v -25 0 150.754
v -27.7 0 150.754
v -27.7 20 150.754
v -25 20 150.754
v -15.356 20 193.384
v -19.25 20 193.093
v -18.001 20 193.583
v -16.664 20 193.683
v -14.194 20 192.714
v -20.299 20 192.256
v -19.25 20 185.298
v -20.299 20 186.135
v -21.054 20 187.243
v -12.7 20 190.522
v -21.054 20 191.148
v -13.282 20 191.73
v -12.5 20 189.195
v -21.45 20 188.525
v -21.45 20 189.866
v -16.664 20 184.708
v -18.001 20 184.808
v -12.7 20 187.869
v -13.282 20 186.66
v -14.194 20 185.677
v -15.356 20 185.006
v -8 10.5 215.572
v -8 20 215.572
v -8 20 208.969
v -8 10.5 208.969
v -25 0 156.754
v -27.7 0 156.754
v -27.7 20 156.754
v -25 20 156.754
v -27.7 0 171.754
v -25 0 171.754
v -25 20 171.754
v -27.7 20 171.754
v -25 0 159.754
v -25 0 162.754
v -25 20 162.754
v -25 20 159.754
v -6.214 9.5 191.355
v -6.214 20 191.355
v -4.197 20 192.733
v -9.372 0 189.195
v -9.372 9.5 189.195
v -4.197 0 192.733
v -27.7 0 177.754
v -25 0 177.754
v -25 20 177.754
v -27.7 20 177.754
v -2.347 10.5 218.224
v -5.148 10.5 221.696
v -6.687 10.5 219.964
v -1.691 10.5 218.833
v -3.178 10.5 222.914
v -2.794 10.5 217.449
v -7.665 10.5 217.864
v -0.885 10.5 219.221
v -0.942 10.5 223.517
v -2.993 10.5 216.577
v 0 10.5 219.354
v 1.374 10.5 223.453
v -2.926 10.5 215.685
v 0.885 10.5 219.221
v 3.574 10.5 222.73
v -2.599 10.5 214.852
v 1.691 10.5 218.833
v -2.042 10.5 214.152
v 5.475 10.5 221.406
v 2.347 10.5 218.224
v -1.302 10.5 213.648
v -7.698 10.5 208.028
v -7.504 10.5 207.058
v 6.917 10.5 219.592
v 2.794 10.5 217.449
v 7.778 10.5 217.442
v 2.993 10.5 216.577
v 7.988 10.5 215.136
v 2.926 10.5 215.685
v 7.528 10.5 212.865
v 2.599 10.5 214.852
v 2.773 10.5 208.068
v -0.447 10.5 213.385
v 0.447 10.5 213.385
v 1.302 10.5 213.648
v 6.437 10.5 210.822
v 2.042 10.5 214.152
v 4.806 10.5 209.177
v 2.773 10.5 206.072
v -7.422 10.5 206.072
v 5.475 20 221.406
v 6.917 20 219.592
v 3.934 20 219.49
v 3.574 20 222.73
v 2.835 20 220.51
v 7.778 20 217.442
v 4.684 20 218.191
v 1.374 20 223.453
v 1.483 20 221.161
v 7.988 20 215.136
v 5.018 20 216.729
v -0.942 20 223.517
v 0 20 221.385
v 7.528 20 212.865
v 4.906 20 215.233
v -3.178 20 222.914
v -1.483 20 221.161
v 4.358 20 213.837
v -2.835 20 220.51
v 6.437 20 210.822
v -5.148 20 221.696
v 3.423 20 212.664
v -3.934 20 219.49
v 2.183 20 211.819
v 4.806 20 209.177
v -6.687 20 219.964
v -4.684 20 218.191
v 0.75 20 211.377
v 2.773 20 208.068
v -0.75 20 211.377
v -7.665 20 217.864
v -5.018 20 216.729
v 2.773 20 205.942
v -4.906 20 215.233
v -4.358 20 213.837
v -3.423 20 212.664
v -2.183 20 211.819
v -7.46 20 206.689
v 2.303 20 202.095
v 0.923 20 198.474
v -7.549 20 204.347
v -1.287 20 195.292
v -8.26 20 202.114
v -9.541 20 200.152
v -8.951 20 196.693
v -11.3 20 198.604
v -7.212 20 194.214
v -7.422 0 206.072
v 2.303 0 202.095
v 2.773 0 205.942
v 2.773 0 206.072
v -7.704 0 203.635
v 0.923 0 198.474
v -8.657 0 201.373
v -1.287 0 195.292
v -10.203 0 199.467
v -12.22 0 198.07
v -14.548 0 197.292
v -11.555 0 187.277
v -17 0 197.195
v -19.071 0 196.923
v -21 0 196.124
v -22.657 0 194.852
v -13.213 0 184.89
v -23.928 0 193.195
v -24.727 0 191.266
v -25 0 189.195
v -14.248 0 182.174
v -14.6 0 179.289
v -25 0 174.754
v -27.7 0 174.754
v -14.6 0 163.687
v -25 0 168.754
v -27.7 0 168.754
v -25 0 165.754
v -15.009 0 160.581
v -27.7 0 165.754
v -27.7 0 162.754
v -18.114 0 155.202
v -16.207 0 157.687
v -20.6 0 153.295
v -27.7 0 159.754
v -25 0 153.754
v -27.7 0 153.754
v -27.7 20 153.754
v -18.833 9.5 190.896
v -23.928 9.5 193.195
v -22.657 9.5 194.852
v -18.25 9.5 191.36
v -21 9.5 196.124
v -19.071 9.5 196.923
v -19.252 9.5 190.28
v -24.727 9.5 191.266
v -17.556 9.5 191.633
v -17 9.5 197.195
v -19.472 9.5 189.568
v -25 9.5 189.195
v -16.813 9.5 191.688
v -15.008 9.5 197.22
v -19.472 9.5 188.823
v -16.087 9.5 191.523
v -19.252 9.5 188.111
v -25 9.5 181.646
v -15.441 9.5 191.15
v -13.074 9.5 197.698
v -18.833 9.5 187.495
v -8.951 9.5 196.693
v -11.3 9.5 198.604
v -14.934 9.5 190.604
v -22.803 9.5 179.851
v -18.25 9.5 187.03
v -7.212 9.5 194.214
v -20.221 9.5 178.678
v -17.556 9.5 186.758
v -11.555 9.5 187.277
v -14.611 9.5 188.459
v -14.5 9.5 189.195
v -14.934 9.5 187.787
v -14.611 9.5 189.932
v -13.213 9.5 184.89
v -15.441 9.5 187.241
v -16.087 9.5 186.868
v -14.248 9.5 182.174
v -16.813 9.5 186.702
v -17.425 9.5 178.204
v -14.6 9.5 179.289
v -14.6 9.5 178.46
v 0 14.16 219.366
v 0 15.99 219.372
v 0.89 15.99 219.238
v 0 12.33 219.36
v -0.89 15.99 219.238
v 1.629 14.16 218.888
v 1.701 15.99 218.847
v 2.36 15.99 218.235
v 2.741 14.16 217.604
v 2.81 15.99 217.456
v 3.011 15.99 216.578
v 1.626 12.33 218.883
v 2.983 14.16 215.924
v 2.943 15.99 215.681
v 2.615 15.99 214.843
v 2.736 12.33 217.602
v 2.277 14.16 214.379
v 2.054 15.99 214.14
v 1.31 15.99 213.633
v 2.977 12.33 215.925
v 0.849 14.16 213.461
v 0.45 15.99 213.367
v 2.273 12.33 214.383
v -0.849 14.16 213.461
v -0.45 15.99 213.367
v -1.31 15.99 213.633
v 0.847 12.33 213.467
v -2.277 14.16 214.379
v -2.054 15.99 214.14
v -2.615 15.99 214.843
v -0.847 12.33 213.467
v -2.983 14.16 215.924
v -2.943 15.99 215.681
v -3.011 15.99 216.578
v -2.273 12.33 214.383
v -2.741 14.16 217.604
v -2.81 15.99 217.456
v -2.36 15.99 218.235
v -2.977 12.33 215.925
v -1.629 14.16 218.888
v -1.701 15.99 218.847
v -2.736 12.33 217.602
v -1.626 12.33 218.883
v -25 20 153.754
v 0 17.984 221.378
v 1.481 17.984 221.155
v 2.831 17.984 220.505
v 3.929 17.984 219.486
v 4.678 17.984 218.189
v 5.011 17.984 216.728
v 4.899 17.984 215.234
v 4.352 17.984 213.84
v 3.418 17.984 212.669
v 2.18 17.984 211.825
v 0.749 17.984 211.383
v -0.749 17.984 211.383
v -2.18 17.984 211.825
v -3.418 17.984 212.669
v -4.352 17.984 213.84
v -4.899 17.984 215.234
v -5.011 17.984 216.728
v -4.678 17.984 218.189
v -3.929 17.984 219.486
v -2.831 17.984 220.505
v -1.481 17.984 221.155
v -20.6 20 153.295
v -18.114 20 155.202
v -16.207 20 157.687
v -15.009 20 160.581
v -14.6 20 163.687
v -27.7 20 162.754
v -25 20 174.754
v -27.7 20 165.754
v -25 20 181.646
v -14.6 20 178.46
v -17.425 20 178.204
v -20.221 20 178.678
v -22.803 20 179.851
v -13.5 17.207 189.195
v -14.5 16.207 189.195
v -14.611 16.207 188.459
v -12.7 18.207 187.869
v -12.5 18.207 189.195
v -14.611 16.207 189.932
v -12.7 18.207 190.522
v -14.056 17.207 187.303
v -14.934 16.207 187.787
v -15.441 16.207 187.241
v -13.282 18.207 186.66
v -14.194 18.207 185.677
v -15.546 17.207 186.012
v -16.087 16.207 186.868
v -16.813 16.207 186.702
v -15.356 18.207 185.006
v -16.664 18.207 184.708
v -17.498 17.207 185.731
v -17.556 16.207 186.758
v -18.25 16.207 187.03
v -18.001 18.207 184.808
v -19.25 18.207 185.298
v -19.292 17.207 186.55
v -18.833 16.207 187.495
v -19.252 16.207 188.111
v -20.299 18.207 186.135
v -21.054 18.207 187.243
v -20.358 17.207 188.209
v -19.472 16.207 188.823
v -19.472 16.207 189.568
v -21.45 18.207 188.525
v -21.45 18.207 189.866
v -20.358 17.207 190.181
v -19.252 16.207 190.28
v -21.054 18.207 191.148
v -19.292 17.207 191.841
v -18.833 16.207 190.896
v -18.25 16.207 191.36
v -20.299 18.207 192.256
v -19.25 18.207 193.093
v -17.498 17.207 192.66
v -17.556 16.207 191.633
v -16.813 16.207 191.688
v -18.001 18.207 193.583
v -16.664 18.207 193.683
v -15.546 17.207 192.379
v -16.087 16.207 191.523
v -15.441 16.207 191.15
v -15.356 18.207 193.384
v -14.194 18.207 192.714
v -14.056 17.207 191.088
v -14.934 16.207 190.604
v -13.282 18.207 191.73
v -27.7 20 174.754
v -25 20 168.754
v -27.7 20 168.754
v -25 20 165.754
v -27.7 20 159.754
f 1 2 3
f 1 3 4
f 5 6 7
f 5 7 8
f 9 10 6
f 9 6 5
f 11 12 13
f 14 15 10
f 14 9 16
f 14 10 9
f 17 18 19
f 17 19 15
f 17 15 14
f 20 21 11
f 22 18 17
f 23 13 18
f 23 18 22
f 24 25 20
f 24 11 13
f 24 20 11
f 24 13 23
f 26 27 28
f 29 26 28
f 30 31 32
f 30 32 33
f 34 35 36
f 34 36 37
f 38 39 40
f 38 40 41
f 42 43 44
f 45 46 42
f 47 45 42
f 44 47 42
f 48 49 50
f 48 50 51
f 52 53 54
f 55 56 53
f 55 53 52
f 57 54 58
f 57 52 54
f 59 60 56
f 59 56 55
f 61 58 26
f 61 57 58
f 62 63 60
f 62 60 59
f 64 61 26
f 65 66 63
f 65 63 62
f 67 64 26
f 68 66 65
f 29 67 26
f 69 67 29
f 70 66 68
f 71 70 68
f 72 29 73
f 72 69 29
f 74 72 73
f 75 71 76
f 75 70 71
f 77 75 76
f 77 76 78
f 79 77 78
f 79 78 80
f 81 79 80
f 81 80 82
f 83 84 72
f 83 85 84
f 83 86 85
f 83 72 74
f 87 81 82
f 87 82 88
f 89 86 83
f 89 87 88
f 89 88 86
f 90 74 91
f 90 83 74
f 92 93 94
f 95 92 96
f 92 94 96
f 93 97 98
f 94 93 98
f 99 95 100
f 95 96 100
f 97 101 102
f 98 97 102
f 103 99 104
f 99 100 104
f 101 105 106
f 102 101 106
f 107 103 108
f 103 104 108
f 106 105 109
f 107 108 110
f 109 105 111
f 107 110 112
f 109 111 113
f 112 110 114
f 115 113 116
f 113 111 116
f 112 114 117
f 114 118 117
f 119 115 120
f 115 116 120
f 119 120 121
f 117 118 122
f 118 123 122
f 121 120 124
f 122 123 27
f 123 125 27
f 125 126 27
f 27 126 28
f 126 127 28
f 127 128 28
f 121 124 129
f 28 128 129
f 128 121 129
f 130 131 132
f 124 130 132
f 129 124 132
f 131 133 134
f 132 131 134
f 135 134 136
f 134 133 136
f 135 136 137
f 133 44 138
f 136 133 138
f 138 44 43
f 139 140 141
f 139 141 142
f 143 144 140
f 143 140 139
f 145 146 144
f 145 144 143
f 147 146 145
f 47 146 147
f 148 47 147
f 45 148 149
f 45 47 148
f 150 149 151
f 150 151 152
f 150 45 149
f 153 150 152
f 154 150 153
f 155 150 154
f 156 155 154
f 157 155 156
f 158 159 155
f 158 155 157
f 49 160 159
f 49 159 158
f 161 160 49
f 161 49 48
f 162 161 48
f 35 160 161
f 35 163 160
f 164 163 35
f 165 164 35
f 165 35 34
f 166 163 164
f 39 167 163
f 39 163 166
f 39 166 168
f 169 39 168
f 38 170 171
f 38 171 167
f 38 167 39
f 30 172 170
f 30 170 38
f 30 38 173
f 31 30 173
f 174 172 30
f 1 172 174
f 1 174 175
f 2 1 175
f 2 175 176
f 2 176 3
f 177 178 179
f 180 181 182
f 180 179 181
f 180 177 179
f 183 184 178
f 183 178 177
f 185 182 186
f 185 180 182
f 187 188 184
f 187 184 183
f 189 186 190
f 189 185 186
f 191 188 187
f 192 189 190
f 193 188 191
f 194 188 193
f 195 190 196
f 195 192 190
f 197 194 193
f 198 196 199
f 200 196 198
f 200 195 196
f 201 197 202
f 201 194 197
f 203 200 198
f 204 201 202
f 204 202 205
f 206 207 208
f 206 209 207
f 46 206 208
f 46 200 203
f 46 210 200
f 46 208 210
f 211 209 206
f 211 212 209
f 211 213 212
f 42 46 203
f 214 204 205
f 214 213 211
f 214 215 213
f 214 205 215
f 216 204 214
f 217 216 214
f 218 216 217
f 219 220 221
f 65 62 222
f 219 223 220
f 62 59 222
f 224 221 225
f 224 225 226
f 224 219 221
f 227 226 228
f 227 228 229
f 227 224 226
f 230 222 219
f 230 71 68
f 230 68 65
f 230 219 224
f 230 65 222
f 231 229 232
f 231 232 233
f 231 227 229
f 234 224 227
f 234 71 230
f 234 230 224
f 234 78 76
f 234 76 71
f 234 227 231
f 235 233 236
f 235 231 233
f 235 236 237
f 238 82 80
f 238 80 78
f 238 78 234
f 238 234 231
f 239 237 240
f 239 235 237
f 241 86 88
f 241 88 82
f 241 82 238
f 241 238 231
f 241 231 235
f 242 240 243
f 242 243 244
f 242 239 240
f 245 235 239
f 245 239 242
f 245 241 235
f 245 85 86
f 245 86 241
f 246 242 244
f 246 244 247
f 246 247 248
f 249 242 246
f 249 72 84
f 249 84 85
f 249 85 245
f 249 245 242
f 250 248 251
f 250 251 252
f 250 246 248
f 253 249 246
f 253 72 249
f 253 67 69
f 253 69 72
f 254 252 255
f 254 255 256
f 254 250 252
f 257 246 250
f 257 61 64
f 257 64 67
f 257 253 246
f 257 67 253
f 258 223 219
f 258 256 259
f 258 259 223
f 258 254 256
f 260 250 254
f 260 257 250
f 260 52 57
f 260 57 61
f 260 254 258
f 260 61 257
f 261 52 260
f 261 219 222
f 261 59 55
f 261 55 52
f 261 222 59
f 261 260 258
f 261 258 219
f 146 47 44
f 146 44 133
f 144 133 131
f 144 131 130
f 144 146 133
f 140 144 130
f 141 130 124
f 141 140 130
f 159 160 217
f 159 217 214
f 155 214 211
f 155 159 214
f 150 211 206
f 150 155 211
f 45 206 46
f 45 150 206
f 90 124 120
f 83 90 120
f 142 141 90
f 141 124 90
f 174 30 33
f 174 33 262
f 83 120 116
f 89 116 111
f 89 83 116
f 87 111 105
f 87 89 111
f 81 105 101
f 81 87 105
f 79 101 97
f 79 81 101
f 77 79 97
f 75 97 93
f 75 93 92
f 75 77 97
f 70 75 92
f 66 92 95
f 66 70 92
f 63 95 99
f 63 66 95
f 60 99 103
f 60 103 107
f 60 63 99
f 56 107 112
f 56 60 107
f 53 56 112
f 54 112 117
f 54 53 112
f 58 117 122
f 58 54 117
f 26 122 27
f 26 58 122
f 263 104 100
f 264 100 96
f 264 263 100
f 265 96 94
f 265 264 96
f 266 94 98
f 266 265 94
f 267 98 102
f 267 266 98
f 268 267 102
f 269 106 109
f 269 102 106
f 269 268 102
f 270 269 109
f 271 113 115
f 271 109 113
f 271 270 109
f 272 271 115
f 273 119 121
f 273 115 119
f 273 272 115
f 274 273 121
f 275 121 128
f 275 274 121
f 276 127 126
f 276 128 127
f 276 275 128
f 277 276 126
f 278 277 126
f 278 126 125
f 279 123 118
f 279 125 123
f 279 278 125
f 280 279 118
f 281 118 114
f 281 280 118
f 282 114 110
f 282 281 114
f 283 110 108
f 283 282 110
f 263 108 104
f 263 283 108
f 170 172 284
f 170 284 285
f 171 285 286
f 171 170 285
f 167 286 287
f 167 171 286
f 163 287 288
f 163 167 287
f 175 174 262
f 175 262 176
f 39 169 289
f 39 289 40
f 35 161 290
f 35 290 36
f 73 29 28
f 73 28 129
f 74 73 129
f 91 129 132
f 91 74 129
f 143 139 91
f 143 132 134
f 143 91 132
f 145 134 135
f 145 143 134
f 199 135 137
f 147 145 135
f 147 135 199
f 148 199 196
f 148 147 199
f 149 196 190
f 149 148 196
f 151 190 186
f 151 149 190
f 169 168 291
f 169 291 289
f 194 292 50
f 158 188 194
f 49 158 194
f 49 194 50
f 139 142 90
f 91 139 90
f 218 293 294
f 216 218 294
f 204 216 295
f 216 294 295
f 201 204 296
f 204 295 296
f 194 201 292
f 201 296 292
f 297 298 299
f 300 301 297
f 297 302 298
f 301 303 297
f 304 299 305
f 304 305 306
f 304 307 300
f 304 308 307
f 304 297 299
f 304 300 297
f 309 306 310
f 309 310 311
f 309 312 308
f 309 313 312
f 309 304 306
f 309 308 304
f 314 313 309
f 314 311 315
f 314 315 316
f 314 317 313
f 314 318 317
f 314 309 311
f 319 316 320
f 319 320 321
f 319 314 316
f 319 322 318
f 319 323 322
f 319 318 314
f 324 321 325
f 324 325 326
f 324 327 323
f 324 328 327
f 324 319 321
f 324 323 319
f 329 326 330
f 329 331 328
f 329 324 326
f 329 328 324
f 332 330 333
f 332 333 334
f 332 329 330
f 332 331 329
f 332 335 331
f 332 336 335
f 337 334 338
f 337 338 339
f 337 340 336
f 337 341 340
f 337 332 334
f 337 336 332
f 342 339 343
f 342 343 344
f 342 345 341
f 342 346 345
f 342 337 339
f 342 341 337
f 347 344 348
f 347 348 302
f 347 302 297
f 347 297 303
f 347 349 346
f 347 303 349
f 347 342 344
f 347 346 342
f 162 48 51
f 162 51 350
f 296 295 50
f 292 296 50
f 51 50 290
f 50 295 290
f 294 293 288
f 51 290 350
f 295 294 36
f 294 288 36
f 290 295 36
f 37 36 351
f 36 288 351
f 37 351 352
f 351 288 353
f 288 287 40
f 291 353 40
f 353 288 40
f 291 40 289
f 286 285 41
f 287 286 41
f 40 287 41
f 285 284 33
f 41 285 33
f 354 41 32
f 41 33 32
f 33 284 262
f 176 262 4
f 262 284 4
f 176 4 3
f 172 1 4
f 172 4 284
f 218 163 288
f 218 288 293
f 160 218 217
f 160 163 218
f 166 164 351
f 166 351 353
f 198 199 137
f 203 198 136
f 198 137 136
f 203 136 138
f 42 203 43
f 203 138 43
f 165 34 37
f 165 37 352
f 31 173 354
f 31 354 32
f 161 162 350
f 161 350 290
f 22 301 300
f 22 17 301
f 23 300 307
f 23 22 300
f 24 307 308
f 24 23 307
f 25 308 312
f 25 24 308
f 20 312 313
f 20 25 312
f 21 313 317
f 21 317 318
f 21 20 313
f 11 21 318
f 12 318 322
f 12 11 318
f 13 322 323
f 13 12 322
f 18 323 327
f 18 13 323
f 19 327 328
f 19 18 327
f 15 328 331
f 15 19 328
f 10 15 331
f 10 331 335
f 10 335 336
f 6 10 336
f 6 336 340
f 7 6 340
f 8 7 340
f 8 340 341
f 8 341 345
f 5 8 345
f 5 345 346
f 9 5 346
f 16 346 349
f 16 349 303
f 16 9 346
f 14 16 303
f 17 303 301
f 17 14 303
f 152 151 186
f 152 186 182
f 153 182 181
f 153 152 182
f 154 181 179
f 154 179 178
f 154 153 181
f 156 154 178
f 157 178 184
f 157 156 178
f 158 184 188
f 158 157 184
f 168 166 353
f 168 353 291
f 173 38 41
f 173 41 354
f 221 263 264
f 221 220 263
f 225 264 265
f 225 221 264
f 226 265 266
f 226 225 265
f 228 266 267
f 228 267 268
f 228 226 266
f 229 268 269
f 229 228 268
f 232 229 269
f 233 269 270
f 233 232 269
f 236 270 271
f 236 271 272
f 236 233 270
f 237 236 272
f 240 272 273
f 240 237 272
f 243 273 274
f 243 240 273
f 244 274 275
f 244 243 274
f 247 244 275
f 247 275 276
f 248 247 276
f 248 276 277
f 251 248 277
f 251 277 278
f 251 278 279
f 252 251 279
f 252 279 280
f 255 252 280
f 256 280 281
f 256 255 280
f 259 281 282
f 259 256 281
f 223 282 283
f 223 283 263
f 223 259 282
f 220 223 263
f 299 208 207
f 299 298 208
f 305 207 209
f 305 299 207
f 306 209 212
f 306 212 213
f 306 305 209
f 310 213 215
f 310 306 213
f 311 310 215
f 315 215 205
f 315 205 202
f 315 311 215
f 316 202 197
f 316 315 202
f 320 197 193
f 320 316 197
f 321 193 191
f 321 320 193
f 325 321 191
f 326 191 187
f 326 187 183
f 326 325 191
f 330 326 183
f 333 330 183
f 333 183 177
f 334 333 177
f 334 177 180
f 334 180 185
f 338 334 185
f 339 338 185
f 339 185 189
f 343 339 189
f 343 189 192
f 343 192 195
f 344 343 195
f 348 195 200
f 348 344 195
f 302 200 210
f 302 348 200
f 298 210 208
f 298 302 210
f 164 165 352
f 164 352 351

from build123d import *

# Parameters (mm, degrees)
BOSS_EXTRUDE1_DEPTH     = 20
SKETCH2_W               = 19.610643165
SKETCH2_H               = 11
CUT_EXTRUDE1_DEPTH      = 227.167829004
CUT_EXTRUDE1_DEPTH_BACK = 227.167829004
SKETCH7_R               = 11
CUT_EXTRUDE2_DEPTH      = 10.5
SKETCH6_W               = 2.5
SKETCH6_H               = 6.937111225


with BuildPart() as part:
    # Sketch1 → Boss-Extrude1 (new body)
    with BuildSketch(Plane(origin=(0, 0, 0), x_dir=(1, 0, 0), z_dir=(0, 1, 0))):
        with BuildLine():
            Line((-14.599777392, -163.687024017), (-14.599777392, -179.289222575))
            ThreePointArc((-14.599777392, -179.289222575), (-13.212758245, -184.889636615), (-9.372337822, -189.195403737))
            Line((-9.372337822, -189.195403737), (-4.197358995, -192.733382325))
            ThreePointArc((-4.197358995, -192.733382325), (0.923201568, -198.474405155), (2.772560431, -205.941623874))
            Line((2.772560431, -205.941623874), (2.772560431, -208.068159927))
            ThreePointArc((2.772560431, -208.068159927), (4.572718915, -222.13666845), (-8, -215.572352665))
            Line((-8, -215.572352665), (-8, -208.969123671))
            ThreePointArc((-8, -208.969123671), (-9.205712947, -200.564063539), (-17, -197.195403737))
            ThreePointArc((-17, -197.195403737), (-22.656854249, -194.852257987), (-25, -189.195403737))
            Line((-25, -189.195403737), (-25, -177.754249464))
            Line((-25, -177.754249464), (-27.7, -177.754249464))
            Line((-27.7, -177.754249464), (-27.7, -174.754249464))
            Line((-27.7, -174.754249464), (-25, -174.754249464))
            Line((-25, -174.754249464), (-25, -171.754249464))
            Line((-25, -171.754249464), (-27.7, -171.754249464))
            Line((-27.7, -171.754249464), (-27.7, -168.754249464))
            Line((-27.7, -168.754249464), (-25, -168.754249464))
            Line((-25, -168.754249464), (-25, -165.754249464))
            Line((-25, -165.754249464), (-27.7, -165.754249464))
            Line((-27.7, -165.754249464), (-27.7, -162.754249464))
            Line((-27.7, -162.754249464), (-25, -162.754249464))
            Line((-25, -162.754249464), (-25, -159.754249464))
            Line((-25, -159.754249464), (-27.7, -159.754249464))
            Line((-27.7, -159.754249464), (-27.7, -156.754249464))
            Line((-27.7, -156.754249464), (-25, -156.754249464))
            Line((-25, -156.754249464), (-25, -153.754249464))
            Line((-25, -153.754249464), (-27.7, -153.754249464))
            Line((-27.7, -153.754249464), (-27.7, -150.754249464))
            Line((-27.7, -150.754249464), (-25, -150.754249464))
            Line((-25, -150.754249464), (-20.599777392, -153.294719172))
            ThreePointArc((-20.599777392, -153.294719172), (-16.207472546, -157.687024017), (-14.599777392, -163.687024017))
        make_face()
    extrude(amount=BOSS_EXTRUDE1_DEPTH)

    # Sketch2 → Cut-Extrude1 (cut, two sides)
    with BuildSketch(Plane(origin=(0, 0, 0), x_dir=(0, 0, -1), z_dir=(1, 0, 0))) as cut_extrude1_sk:
        with Locations((-215.877674248, 5)):
            Rectangle(SKETCH2_W, SKETCH2_H)
    extrude(amount=CUT_EXTRUDE1_DEPTH, mode=Mode.SUBTRACT)
    extrude(cut_extrude1_sk.sketch, amount=-CUT_EXTRUDE1_DEPTH_BACK, mode=Mode.SUBTRACT)

    # Sketch4 → Cut-Revolve8 (revolve, cut)
    with BuildSketch(Plane(origin=(0, 0, 0), x_dir=(0, 0, -1), z_dir=(1, 0, 0)), mode=Mode.PRIVATE) as cut_revolve8_sk:
        Polygon((-213.371823115, 3.99935592), (-216.352696282, 4.00886504), (-216.352696282, 9.999898237), (-216.352696282, 21.744358227), (-211.315205583, 21.744358227), (-211.327201493, 17.983937872), (-213.333571374, 15.990328105), (-213.352711547, 9.990358634), align=None)
    revolve(cut_revolve8_sk.sketch.rotate(Axis((0, 4.00886504, 216.352696282), (0, 1, 0)), 180), axis=Axis((0, 4.00886504, 216.352696282), (0, 1, 0)), mode=Mode.SUBTRACT)

    # Sketch7 → Cut-Extrude2 (cut)
    with BuildSketch(Plane(origin=(0, 20, 0), x_dir=(1, 0, 0), z_dir=(0, 1, 0))):
        with Locations((-17, -189.195403737)):
            Circle(SKETCH7_R)
    extrude(amount=-CUT_EXTRUDE2_DEPTH, mode=Mode.SUBTRACT)

    # Sketch6 → Revolve2 (revolve)
    with BuildSketch(Plane.XY.offset(189.195403737)):
        Polygon((-17, 10), (-14.5, 10), (-14.5, 16.207106781), (-12.5, 18.207106781), (-12.5, 20), (-17, 20), align=None)
        with Locations((-15.75, 6.531444388)):
            Rectangle(SKETCH6_W, SKETCH6_H)
        Polygon((-14, 16), (-14, 10), (-9, 10), (-9, 20), (-12, 20), (-12, 18), align=None)
    revolve(axis=Axis((-17, 0, 189.195403737), (0, 1, 0)))


with BuildPart() as revolve2_kept_piece:
    # of the separate pieces the step leaves, the one the design keeps (revolve2_pieces_kept)
    add(part.part.solids().sort_by_distance((-25, 0, 189.195403737))[0])


solid = revolve2_kept_piece.part
